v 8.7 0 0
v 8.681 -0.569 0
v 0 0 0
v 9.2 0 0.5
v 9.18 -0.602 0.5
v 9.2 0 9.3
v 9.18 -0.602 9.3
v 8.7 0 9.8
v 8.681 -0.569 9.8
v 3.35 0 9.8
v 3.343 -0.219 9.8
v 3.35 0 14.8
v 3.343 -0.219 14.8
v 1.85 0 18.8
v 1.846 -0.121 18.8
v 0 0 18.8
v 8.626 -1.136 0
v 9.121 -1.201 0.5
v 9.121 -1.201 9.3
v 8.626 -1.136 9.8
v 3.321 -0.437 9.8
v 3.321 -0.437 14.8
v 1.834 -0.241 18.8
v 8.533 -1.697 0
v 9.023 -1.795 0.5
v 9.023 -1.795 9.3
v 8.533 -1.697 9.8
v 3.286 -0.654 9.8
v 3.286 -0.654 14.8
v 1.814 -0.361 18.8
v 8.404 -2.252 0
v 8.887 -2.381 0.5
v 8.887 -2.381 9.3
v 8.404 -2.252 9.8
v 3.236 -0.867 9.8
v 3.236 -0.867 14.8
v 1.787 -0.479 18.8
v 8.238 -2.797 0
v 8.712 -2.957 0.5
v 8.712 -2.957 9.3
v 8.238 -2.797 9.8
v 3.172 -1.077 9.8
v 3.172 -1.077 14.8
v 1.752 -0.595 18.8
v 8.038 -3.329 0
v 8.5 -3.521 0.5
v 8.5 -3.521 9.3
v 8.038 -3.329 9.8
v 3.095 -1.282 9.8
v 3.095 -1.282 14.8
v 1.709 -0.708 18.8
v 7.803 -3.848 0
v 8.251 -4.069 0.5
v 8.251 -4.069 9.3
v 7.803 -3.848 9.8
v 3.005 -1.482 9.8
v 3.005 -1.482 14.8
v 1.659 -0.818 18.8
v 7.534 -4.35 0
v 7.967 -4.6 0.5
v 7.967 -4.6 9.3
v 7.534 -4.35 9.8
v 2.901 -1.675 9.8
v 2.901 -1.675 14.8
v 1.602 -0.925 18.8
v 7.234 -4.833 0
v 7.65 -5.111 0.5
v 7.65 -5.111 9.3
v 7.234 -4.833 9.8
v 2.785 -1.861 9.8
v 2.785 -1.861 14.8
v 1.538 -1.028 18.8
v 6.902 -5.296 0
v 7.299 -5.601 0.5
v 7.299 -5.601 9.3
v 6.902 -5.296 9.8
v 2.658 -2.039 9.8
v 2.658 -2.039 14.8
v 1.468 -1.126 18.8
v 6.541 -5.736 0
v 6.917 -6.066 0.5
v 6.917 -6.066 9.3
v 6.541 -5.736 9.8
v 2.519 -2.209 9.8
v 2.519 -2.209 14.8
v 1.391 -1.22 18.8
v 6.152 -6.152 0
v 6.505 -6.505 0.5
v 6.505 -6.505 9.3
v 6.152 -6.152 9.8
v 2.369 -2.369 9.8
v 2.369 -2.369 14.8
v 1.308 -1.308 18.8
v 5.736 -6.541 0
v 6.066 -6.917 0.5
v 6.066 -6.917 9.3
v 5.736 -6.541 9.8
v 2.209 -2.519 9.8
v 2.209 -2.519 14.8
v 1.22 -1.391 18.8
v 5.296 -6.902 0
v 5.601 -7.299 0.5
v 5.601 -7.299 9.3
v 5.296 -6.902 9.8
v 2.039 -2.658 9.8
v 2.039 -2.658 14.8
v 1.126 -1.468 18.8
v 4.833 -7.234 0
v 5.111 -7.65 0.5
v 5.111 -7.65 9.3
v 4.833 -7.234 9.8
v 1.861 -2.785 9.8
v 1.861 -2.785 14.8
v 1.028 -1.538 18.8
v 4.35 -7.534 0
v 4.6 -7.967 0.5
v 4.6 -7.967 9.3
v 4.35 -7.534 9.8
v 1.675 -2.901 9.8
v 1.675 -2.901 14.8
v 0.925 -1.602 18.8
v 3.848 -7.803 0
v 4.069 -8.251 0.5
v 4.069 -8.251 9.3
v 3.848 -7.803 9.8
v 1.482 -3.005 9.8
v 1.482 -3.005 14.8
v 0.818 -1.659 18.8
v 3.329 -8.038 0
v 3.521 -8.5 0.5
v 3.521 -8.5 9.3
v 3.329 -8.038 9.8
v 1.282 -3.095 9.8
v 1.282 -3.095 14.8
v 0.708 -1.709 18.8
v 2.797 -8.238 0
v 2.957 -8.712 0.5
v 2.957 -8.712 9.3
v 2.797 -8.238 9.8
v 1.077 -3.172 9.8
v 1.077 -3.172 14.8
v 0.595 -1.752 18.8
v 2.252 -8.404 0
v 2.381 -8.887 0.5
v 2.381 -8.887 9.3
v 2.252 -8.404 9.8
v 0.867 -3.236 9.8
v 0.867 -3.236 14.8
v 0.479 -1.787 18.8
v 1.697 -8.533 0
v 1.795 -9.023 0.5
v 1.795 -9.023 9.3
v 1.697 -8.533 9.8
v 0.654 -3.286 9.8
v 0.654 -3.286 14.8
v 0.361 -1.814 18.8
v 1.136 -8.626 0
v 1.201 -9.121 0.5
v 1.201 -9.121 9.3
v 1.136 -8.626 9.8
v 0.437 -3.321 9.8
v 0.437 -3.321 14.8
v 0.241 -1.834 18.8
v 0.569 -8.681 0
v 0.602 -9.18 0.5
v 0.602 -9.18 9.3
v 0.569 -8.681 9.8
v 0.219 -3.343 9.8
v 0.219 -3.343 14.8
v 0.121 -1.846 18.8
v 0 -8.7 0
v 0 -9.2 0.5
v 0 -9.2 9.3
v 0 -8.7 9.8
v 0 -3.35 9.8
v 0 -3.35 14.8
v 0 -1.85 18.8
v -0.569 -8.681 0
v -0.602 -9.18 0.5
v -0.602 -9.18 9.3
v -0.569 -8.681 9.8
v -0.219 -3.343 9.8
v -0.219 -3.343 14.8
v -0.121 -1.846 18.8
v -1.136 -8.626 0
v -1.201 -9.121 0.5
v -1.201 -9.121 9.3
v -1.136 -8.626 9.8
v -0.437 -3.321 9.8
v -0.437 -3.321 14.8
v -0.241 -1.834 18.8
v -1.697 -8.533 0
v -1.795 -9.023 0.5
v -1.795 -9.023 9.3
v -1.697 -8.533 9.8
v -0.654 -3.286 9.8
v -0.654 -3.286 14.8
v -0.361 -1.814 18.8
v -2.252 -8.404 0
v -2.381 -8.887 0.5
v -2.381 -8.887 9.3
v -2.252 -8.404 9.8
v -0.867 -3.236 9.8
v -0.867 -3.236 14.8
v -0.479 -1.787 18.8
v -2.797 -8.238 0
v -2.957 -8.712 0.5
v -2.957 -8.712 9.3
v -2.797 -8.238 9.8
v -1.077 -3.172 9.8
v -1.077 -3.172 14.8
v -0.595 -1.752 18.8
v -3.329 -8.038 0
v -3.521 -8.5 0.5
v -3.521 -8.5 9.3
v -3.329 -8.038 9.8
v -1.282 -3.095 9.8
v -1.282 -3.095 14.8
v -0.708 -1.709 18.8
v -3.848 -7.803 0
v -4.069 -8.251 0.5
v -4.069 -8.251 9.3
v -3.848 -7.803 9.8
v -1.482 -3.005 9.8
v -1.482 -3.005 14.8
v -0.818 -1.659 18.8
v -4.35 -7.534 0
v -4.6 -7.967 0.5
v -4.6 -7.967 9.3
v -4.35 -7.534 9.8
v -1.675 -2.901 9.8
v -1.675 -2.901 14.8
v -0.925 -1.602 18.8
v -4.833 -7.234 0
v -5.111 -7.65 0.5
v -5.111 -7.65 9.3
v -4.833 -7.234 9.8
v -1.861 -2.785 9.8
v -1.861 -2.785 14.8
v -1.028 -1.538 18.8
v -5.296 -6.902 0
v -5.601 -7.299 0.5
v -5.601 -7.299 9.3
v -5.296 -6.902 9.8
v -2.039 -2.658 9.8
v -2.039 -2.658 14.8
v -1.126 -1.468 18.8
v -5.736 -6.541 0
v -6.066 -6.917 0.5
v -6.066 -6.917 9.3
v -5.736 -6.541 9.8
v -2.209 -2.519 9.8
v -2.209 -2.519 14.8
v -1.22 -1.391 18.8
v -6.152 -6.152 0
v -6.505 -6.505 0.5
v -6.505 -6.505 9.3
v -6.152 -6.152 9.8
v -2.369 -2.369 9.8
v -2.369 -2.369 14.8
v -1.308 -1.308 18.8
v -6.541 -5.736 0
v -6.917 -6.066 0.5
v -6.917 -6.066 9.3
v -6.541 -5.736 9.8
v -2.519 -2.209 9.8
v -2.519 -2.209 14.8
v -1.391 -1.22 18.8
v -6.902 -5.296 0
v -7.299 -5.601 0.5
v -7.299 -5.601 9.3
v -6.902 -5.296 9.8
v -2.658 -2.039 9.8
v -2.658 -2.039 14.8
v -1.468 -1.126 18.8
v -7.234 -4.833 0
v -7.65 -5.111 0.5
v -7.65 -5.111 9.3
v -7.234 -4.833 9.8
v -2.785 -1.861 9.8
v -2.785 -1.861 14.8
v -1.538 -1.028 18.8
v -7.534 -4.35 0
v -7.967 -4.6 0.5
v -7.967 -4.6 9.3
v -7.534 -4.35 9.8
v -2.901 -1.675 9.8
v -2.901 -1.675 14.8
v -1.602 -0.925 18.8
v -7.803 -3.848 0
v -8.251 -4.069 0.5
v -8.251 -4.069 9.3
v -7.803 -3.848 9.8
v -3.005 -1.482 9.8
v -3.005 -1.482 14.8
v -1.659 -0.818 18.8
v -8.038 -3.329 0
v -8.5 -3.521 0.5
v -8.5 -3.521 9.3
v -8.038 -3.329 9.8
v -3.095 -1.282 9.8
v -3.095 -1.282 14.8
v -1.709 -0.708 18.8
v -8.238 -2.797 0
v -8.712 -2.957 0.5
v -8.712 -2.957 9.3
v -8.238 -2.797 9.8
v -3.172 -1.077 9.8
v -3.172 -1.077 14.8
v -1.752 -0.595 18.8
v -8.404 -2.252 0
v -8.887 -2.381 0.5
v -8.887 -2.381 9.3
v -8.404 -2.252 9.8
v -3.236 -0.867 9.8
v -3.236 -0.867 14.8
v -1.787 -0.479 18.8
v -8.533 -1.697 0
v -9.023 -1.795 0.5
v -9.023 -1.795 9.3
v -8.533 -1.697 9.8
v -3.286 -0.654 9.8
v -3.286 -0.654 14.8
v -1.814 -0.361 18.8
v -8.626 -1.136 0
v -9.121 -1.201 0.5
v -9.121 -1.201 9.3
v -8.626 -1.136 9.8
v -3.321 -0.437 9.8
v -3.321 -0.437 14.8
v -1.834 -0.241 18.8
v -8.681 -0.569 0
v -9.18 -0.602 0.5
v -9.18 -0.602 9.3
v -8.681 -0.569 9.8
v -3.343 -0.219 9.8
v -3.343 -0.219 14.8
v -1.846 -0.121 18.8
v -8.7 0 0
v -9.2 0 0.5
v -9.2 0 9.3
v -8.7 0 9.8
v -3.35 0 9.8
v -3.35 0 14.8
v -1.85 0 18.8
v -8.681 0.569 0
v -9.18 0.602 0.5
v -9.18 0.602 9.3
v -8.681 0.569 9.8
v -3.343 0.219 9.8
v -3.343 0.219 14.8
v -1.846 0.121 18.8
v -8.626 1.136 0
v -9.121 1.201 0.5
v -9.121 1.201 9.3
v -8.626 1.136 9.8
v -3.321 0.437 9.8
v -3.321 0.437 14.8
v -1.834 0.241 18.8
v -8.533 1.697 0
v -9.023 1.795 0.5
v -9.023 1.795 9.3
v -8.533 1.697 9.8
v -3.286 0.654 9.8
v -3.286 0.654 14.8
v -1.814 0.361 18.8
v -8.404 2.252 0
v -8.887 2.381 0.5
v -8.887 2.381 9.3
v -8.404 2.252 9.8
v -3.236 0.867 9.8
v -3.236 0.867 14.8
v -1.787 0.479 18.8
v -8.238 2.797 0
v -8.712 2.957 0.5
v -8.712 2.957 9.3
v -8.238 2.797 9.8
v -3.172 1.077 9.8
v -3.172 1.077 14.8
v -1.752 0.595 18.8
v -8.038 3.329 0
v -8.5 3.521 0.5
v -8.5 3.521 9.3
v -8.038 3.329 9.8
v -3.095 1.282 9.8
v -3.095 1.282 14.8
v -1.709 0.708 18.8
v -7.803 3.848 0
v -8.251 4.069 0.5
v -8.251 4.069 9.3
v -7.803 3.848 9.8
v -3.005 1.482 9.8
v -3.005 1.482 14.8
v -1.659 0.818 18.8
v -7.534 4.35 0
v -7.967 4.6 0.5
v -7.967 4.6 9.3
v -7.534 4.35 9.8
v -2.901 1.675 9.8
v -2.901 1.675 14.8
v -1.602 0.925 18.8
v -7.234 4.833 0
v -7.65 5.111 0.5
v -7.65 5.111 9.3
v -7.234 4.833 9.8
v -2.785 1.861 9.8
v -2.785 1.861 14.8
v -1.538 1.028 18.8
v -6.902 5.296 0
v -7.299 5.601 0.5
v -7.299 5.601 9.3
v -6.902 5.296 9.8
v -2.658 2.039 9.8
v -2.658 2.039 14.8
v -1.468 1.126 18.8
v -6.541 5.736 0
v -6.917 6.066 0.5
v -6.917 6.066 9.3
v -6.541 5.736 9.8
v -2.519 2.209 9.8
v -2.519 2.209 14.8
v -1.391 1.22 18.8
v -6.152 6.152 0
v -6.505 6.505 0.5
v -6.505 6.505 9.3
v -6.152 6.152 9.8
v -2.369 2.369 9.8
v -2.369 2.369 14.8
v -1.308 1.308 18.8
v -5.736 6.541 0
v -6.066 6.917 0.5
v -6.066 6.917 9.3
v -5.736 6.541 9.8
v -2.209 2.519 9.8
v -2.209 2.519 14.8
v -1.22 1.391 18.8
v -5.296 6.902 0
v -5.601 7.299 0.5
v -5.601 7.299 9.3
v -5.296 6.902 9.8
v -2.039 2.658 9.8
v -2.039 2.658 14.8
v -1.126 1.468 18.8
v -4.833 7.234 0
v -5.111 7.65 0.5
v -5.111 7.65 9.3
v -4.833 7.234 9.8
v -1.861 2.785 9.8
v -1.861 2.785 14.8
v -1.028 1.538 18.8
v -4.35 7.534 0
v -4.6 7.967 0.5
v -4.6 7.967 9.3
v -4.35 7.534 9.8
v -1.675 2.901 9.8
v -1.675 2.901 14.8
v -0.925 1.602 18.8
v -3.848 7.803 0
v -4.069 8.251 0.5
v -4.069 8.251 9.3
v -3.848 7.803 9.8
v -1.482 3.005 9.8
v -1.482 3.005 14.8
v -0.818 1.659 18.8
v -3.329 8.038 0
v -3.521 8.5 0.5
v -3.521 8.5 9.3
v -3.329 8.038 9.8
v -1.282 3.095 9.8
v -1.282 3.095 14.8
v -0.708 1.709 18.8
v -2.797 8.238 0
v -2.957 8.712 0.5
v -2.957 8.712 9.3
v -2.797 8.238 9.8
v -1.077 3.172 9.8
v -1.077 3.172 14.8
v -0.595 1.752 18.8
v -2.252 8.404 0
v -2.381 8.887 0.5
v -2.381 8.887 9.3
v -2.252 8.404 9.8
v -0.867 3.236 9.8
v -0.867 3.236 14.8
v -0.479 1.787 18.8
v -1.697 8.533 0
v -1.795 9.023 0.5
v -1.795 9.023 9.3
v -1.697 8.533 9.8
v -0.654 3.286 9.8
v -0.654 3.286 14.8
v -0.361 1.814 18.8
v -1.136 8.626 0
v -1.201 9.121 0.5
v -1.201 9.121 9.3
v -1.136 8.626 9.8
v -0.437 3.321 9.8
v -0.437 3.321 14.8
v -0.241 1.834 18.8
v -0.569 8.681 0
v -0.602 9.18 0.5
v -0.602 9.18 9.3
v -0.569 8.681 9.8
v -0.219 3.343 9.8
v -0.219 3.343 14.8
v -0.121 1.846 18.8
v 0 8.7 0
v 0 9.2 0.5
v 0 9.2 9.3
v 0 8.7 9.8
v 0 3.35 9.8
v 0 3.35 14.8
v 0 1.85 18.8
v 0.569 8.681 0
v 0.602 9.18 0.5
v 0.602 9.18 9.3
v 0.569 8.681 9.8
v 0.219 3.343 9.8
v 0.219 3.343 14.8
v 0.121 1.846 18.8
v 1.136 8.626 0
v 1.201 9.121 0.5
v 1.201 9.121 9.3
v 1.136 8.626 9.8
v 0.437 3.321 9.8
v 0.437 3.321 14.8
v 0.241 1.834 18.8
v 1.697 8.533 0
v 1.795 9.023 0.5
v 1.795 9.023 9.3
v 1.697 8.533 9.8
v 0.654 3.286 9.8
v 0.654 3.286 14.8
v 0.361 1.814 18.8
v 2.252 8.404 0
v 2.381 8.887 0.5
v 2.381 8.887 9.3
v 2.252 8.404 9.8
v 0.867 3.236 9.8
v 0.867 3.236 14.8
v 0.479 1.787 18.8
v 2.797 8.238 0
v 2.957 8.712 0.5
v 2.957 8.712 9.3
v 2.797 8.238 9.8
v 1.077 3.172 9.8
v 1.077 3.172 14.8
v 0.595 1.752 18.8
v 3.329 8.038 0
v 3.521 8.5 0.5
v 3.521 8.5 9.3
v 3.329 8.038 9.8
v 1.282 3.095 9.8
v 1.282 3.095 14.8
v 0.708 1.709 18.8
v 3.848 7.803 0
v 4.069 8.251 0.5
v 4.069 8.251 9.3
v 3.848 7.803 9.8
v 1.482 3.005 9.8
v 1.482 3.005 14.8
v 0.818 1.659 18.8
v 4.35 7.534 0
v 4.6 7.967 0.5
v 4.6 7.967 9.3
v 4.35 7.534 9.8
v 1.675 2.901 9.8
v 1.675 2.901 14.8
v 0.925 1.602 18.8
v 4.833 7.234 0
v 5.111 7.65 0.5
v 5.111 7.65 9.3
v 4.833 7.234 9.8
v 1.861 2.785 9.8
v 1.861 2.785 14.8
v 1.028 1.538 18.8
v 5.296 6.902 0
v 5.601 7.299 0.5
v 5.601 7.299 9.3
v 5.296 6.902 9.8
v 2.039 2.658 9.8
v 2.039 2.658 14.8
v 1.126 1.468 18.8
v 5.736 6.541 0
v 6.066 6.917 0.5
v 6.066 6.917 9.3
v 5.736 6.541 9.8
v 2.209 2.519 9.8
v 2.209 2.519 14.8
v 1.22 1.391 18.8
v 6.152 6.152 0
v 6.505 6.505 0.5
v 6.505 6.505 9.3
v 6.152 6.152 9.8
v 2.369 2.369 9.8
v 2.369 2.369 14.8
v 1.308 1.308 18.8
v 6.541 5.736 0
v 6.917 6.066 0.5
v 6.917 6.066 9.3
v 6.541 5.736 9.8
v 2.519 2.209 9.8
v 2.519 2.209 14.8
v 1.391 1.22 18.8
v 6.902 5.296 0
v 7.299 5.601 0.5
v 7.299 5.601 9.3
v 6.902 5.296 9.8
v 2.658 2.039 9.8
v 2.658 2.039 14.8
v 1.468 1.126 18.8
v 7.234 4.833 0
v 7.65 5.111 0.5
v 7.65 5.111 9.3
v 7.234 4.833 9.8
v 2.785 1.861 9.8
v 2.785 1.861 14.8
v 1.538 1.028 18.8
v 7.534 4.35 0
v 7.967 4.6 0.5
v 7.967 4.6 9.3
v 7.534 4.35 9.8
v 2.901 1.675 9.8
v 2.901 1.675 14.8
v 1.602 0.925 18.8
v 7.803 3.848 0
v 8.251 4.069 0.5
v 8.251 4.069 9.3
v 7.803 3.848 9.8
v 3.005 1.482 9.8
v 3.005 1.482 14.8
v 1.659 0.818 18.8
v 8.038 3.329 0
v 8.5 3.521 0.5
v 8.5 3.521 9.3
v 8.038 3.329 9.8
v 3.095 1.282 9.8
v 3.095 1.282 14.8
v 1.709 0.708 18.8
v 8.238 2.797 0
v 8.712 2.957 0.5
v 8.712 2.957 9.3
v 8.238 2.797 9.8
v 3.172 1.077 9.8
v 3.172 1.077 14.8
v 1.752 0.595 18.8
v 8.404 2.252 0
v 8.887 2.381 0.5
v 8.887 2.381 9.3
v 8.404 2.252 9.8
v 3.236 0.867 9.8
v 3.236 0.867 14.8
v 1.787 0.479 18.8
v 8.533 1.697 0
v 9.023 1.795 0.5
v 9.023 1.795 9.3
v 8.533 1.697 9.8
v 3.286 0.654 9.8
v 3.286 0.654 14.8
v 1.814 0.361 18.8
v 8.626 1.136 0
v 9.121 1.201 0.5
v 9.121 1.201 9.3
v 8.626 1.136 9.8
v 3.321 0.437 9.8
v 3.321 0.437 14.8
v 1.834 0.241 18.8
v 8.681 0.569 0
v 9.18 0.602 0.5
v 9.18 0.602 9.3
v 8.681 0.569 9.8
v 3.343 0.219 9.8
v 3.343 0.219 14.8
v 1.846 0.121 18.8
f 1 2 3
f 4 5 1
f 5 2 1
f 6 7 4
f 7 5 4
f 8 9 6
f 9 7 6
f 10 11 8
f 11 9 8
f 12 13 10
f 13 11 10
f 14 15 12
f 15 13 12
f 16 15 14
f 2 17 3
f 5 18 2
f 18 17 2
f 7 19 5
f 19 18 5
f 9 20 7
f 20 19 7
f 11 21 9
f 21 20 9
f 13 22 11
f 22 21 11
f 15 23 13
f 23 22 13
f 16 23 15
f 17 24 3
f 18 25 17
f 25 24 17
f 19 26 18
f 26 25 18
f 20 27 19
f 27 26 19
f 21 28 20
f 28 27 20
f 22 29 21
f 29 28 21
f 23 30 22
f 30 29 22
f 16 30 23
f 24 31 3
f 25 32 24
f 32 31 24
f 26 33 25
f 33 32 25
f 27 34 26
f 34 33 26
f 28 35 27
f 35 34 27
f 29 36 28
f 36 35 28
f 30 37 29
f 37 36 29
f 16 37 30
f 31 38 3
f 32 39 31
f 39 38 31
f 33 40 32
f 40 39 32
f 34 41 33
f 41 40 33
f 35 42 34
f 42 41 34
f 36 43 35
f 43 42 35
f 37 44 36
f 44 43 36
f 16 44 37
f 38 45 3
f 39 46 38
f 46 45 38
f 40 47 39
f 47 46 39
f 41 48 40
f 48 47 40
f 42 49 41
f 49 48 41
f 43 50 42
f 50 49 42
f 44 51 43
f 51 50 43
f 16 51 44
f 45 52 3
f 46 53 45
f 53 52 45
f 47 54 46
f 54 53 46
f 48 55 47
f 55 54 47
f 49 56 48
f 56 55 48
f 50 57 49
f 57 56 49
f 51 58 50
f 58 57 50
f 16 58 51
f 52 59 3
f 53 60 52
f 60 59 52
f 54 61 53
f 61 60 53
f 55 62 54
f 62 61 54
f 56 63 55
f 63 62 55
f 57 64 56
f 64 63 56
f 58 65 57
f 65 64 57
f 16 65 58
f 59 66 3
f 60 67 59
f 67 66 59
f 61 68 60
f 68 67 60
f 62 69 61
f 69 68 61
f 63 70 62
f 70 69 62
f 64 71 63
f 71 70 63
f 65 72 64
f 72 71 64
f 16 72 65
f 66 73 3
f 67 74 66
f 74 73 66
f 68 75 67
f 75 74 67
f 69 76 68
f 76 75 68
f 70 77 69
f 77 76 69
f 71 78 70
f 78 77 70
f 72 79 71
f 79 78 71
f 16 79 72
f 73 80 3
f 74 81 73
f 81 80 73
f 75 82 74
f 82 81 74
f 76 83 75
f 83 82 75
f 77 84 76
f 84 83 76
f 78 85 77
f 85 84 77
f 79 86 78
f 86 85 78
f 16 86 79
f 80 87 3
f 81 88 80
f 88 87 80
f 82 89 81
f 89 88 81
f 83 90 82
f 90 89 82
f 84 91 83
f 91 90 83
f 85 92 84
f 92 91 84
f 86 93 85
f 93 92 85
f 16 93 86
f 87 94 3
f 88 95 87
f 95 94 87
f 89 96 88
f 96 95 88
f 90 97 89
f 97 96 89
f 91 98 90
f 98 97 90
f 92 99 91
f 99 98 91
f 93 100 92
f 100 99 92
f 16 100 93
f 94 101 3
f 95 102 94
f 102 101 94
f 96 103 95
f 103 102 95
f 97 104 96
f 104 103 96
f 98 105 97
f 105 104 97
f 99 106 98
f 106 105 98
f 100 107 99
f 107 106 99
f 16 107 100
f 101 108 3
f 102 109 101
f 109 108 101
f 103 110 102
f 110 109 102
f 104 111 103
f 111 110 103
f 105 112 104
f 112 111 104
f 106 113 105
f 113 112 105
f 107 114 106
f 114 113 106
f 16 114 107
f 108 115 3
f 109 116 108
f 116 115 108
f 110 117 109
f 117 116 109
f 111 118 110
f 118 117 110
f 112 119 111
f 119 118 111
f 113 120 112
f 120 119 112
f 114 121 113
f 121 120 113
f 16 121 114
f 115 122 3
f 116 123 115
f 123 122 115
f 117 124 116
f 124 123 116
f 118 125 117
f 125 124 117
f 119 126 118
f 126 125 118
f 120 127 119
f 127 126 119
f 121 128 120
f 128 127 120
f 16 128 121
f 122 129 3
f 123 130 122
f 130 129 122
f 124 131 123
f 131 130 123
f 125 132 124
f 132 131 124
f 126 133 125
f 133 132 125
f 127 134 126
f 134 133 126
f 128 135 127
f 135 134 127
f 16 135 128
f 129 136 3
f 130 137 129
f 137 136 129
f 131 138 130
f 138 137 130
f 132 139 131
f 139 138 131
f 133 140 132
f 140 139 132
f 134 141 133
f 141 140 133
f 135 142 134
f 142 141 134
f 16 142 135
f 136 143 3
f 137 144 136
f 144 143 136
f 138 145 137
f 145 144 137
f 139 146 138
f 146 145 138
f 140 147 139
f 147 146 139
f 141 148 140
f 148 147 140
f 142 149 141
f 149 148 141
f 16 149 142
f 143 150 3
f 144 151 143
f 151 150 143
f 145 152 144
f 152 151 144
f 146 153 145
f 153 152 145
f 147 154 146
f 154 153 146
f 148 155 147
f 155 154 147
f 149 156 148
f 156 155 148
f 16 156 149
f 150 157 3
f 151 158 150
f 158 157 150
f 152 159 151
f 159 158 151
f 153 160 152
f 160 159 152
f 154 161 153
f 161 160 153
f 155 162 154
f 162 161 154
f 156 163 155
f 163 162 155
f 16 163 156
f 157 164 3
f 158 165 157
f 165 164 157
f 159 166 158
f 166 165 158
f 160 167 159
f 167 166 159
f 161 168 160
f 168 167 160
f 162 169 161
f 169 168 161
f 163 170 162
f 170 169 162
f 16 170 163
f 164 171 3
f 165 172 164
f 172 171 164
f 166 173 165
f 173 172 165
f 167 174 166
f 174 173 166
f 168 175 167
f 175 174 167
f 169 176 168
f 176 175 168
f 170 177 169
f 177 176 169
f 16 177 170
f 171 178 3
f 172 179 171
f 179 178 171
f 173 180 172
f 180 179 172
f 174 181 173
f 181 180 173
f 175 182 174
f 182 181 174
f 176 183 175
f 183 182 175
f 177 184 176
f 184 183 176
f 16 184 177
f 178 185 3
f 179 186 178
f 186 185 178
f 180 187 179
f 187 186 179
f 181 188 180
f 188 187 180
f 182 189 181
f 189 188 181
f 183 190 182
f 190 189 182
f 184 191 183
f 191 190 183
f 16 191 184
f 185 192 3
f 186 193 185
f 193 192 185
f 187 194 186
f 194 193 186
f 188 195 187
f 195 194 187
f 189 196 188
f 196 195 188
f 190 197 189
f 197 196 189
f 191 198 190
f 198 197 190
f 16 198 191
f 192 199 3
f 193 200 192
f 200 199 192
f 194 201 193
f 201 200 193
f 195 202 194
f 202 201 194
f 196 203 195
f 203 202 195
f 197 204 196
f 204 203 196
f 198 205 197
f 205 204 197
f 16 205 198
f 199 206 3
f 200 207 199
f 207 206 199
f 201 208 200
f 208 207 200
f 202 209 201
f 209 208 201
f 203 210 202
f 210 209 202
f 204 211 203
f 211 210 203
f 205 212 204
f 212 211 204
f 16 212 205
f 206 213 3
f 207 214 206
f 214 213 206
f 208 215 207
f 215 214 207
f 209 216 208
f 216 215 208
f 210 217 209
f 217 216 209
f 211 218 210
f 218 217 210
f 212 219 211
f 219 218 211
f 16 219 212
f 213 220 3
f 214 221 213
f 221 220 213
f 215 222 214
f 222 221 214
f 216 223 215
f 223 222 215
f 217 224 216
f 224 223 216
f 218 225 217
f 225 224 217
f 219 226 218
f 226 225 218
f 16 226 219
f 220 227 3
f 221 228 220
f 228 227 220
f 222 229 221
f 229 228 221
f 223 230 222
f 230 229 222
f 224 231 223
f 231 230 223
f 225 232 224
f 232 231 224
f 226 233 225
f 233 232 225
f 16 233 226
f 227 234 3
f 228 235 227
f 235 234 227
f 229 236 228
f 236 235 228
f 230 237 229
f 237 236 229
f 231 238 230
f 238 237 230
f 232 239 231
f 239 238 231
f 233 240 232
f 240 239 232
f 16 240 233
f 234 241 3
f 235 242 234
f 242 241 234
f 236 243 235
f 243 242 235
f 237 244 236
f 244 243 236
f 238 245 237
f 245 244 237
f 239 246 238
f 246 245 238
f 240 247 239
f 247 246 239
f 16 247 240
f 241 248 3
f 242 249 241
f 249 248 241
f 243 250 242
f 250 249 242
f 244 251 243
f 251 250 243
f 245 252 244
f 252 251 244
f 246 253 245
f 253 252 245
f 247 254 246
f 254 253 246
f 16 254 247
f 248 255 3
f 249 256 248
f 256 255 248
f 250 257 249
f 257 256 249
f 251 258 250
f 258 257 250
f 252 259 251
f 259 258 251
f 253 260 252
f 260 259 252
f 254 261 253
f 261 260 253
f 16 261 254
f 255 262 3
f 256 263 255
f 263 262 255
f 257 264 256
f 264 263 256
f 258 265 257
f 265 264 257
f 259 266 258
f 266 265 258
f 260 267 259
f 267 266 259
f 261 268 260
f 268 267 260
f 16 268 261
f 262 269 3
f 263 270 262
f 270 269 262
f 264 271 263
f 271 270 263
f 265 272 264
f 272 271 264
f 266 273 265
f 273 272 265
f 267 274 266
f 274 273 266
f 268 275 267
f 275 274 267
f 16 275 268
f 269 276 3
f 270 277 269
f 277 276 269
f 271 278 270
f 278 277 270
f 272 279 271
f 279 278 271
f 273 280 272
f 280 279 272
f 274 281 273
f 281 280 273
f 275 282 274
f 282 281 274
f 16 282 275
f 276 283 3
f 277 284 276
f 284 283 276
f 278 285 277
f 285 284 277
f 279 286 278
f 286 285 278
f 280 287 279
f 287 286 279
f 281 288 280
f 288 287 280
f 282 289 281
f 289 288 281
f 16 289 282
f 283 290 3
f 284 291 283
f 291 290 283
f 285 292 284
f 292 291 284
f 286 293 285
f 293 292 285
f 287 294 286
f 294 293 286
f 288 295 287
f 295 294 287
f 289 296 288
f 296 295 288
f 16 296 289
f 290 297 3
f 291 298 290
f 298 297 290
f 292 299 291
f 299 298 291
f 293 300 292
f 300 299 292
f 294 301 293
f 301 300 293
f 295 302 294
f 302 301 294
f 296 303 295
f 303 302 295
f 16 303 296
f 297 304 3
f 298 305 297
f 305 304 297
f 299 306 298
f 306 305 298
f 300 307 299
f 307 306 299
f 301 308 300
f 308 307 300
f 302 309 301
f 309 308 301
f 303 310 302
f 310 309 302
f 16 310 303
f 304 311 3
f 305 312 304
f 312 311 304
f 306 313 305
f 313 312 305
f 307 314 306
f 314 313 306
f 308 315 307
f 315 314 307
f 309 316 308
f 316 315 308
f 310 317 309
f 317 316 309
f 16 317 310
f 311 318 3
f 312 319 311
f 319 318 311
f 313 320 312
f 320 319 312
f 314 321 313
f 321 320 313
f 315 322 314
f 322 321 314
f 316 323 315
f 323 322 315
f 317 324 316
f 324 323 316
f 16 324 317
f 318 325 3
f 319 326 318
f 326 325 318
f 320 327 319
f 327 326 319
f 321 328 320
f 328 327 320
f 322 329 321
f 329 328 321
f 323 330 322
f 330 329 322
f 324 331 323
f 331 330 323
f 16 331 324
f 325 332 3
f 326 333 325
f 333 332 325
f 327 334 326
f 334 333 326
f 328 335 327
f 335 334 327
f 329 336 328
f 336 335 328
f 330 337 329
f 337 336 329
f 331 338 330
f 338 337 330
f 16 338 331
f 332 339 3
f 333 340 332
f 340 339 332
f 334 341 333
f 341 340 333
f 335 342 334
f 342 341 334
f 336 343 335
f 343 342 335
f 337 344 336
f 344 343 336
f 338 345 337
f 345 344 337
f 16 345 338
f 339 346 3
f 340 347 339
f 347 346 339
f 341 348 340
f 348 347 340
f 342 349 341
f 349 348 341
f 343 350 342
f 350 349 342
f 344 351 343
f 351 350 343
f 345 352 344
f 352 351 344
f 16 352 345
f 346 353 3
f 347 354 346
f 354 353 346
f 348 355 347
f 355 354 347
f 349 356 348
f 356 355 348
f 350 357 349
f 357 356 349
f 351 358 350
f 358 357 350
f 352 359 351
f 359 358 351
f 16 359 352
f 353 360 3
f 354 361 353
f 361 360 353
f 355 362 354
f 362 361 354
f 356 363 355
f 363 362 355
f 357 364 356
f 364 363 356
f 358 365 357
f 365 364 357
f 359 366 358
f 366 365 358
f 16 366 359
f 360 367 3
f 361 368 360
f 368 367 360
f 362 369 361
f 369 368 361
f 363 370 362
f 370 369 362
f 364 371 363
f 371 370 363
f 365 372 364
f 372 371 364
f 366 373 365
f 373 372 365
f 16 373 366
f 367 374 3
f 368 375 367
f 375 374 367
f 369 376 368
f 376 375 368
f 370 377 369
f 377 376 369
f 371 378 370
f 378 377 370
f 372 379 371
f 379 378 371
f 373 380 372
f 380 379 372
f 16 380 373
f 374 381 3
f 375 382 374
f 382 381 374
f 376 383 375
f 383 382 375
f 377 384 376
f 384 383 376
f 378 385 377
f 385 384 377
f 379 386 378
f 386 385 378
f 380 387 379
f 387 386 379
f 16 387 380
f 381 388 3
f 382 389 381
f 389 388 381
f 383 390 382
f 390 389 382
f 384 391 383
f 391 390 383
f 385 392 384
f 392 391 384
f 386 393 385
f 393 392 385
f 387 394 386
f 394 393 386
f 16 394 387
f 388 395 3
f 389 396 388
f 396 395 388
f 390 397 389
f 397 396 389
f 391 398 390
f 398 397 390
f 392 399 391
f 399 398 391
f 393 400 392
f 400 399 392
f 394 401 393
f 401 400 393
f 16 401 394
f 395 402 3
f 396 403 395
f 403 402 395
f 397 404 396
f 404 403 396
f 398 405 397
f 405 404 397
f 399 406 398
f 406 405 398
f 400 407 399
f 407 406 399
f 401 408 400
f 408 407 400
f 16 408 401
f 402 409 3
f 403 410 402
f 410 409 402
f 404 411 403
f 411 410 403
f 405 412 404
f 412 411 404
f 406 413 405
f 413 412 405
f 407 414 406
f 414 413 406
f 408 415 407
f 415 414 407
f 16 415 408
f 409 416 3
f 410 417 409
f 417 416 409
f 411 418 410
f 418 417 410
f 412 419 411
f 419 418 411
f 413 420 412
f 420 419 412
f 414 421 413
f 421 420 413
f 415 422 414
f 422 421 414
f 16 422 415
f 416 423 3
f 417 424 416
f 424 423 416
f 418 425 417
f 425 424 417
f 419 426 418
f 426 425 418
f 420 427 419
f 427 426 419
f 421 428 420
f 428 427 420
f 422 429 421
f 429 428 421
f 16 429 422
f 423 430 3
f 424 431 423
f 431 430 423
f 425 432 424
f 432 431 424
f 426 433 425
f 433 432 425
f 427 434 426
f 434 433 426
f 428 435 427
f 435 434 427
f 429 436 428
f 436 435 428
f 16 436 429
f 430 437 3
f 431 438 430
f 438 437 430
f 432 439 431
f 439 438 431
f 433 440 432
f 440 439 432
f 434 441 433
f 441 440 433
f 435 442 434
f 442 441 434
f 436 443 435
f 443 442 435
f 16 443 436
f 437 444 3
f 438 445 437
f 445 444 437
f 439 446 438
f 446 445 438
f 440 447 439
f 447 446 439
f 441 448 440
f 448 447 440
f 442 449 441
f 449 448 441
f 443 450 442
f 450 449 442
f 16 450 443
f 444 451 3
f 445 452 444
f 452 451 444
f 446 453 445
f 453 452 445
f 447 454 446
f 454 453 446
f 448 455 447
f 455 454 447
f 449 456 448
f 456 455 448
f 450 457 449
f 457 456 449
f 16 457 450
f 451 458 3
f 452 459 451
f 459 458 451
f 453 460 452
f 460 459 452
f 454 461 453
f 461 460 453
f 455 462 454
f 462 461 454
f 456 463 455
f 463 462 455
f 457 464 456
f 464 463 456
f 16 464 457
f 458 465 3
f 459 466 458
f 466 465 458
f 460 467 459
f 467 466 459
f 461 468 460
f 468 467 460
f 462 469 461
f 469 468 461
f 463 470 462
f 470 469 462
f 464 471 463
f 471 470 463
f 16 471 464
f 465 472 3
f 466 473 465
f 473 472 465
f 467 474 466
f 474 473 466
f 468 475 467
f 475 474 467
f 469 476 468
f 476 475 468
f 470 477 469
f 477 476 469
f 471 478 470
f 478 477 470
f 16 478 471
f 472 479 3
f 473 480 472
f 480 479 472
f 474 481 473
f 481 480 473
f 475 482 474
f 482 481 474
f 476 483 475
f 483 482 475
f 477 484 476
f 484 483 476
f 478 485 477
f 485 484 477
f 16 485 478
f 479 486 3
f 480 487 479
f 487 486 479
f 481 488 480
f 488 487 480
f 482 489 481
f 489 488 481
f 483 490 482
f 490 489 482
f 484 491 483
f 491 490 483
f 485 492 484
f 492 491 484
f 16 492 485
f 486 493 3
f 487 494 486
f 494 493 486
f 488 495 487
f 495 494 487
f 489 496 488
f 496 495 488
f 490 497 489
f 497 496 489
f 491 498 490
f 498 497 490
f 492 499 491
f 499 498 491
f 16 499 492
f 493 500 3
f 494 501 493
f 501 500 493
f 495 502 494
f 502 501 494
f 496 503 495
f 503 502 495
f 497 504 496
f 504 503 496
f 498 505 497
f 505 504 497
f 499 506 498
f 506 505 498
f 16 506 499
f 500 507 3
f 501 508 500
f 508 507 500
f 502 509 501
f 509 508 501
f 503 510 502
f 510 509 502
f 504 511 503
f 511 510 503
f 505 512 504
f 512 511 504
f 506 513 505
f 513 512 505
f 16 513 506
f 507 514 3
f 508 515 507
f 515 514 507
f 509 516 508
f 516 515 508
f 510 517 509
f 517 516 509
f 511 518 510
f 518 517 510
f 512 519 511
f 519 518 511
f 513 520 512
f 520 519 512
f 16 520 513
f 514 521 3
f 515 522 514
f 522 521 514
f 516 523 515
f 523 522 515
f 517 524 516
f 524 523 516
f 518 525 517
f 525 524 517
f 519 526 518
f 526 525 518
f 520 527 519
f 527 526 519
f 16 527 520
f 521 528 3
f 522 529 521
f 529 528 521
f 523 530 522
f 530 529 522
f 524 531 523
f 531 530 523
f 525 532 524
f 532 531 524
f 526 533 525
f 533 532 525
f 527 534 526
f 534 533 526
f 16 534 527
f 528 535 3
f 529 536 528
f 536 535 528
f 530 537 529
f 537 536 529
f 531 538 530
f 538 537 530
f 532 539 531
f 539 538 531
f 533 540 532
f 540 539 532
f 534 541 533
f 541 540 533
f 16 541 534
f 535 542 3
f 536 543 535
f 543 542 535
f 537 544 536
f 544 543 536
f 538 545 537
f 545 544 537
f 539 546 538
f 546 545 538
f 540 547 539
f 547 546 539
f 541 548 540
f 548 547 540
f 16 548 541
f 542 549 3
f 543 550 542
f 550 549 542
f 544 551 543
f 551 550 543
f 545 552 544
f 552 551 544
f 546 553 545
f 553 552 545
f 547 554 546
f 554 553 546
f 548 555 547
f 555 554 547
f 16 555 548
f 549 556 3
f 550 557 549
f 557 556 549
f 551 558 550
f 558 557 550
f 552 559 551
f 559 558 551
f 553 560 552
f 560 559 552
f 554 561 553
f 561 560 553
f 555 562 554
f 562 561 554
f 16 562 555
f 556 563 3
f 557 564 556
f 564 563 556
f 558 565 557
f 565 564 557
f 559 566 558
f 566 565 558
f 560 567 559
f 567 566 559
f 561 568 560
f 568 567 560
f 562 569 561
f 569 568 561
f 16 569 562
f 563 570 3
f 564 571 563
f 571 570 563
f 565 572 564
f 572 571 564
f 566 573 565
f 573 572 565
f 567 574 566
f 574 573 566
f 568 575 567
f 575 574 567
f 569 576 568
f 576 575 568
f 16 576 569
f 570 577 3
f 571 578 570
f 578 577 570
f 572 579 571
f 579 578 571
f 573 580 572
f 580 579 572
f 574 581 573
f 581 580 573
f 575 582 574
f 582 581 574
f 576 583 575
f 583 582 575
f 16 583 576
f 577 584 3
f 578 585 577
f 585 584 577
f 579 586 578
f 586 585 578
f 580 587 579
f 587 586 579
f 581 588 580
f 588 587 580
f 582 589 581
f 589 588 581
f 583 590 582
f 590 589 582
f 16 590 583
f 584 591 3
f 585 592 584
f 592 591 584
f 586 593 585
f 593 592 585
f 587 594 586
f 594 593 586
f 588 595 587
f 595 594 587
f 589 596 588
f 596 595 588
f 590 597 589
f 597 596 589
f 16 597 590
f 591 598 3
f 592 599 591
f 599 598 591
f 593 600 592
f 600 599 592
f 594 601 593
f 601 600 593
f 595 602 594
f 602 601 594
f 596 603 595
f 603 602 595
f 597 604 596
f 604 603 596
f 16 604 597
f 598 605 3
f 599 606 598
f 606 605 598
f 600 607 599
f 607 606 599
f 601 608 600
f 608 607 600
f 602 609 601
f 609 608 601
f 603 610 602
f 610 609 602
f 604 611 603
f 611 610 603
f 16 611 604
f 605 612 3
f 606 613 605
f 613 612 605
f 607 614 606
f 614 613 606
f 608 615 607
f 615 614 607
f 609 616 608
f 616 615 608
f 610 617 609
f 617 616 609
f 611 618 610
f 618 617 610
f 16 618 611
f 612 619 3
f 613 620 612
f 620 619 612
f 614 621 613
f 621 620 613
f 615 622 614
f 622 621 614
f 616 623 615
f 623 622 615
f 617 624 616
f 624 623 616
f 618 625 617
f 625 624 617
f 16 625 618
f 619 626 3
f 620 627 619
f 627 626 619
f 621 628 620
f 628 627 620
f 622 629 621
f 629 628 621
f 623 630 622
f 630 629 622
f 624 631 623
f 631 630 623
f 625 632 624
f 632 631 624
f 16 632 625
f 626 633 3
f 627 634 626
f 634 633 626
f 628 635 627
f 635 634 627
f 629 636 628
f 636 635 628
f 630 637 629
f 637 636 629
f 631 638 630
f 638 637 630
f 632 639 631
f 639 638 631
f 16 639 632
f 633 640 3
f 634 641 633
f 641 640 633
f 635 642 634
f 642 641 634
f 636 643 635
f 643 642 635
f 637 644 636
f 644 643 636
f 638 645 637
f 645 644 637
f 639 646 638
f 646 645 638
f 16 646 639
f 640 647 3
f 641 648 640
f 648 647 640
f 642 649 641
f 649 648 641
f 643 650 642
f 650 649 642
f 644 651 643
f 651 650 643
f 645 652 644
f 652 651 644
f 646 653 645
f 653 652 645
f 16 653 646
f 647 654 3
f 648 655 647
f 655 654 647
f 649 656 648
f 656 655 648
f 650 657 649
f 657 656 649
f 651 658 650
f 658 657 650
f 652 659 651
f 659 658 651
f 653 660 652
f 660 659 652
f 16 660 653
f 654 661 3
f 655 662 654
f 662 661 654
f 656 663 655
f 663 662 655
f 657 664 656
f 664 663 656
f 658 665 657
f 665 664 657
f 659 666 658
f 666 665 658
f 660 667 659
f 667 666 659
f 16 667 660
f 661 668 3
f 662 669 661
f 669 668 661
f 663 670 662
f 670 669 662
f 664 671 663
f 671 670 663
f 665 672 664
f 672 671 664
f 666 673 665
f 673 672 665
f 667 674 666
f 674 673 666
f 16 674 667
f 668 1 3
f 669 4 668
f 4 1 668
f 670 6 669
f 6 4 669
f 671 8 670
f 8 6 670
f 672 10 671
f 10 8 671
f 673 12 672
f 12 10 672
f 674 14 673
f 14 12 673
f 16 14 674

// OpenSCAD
// WhiteShelfFoot-v1.2
// 
// Replacement feet for the white shelves Sara
// dragged home from Rich Bitch Land
// 
// v1.1:
// - Define 'stem margin' with default 0.2
// v1.2:
// - Default stem_diameter = 7.0, stem_margin = 0.15
// - Forget about making them stackable, by default

main_height   =  9.8;
main_diameter = 18.4;
stem_diameter =  7.0;
total_height  = 18.8;

stem_margin   =  0.15;

top_bevel_size = 0.5;
mouth_bevel_size = 0.5;
bottom_bevel_size = 0.5;

stackable = false;

stem_height = total_height - main_height;

$fn = $preview ? 16 : 96;

rotate_extrude() polygon([
	each stackable ? [
		// Negative stem
		[                                 0  ,  stem_height    ],
		[-stem_diameter/2 - stem_margin + 1.3,  stem_height    ],
		[-stem_diameter/2 - stem_margin + 0.2,  stem_height - 4],
		[-stem_diameter/2 - stem_margin      , mouth_bevel_size],
		[-stem_diameter/2 - stem_margin - mouth_bevel_size,   0],
	] : [
		[0,0]
	],

	// Main body
	[-main_diameter/2 + bottom_bevel_size,                0],
	[-main_diameter/2                    ,bottom_bevel_size],
	[-main_diameter/2                    ,  main_height - top_bevel_size],
	[-main_diameter/2 + top_bevel_size   ,  main_height     ],

	// Positive stem
	[-stem_diameter/2 + stem_margin      ,  main_height     ],
	[-stem_diameter/2 + stem_margin      , total_height  - 4],
	[-stem_diameter/2 + stem_margin  + 1.5, total_height    ],
	[                                  0  , total_height    ],
]);
